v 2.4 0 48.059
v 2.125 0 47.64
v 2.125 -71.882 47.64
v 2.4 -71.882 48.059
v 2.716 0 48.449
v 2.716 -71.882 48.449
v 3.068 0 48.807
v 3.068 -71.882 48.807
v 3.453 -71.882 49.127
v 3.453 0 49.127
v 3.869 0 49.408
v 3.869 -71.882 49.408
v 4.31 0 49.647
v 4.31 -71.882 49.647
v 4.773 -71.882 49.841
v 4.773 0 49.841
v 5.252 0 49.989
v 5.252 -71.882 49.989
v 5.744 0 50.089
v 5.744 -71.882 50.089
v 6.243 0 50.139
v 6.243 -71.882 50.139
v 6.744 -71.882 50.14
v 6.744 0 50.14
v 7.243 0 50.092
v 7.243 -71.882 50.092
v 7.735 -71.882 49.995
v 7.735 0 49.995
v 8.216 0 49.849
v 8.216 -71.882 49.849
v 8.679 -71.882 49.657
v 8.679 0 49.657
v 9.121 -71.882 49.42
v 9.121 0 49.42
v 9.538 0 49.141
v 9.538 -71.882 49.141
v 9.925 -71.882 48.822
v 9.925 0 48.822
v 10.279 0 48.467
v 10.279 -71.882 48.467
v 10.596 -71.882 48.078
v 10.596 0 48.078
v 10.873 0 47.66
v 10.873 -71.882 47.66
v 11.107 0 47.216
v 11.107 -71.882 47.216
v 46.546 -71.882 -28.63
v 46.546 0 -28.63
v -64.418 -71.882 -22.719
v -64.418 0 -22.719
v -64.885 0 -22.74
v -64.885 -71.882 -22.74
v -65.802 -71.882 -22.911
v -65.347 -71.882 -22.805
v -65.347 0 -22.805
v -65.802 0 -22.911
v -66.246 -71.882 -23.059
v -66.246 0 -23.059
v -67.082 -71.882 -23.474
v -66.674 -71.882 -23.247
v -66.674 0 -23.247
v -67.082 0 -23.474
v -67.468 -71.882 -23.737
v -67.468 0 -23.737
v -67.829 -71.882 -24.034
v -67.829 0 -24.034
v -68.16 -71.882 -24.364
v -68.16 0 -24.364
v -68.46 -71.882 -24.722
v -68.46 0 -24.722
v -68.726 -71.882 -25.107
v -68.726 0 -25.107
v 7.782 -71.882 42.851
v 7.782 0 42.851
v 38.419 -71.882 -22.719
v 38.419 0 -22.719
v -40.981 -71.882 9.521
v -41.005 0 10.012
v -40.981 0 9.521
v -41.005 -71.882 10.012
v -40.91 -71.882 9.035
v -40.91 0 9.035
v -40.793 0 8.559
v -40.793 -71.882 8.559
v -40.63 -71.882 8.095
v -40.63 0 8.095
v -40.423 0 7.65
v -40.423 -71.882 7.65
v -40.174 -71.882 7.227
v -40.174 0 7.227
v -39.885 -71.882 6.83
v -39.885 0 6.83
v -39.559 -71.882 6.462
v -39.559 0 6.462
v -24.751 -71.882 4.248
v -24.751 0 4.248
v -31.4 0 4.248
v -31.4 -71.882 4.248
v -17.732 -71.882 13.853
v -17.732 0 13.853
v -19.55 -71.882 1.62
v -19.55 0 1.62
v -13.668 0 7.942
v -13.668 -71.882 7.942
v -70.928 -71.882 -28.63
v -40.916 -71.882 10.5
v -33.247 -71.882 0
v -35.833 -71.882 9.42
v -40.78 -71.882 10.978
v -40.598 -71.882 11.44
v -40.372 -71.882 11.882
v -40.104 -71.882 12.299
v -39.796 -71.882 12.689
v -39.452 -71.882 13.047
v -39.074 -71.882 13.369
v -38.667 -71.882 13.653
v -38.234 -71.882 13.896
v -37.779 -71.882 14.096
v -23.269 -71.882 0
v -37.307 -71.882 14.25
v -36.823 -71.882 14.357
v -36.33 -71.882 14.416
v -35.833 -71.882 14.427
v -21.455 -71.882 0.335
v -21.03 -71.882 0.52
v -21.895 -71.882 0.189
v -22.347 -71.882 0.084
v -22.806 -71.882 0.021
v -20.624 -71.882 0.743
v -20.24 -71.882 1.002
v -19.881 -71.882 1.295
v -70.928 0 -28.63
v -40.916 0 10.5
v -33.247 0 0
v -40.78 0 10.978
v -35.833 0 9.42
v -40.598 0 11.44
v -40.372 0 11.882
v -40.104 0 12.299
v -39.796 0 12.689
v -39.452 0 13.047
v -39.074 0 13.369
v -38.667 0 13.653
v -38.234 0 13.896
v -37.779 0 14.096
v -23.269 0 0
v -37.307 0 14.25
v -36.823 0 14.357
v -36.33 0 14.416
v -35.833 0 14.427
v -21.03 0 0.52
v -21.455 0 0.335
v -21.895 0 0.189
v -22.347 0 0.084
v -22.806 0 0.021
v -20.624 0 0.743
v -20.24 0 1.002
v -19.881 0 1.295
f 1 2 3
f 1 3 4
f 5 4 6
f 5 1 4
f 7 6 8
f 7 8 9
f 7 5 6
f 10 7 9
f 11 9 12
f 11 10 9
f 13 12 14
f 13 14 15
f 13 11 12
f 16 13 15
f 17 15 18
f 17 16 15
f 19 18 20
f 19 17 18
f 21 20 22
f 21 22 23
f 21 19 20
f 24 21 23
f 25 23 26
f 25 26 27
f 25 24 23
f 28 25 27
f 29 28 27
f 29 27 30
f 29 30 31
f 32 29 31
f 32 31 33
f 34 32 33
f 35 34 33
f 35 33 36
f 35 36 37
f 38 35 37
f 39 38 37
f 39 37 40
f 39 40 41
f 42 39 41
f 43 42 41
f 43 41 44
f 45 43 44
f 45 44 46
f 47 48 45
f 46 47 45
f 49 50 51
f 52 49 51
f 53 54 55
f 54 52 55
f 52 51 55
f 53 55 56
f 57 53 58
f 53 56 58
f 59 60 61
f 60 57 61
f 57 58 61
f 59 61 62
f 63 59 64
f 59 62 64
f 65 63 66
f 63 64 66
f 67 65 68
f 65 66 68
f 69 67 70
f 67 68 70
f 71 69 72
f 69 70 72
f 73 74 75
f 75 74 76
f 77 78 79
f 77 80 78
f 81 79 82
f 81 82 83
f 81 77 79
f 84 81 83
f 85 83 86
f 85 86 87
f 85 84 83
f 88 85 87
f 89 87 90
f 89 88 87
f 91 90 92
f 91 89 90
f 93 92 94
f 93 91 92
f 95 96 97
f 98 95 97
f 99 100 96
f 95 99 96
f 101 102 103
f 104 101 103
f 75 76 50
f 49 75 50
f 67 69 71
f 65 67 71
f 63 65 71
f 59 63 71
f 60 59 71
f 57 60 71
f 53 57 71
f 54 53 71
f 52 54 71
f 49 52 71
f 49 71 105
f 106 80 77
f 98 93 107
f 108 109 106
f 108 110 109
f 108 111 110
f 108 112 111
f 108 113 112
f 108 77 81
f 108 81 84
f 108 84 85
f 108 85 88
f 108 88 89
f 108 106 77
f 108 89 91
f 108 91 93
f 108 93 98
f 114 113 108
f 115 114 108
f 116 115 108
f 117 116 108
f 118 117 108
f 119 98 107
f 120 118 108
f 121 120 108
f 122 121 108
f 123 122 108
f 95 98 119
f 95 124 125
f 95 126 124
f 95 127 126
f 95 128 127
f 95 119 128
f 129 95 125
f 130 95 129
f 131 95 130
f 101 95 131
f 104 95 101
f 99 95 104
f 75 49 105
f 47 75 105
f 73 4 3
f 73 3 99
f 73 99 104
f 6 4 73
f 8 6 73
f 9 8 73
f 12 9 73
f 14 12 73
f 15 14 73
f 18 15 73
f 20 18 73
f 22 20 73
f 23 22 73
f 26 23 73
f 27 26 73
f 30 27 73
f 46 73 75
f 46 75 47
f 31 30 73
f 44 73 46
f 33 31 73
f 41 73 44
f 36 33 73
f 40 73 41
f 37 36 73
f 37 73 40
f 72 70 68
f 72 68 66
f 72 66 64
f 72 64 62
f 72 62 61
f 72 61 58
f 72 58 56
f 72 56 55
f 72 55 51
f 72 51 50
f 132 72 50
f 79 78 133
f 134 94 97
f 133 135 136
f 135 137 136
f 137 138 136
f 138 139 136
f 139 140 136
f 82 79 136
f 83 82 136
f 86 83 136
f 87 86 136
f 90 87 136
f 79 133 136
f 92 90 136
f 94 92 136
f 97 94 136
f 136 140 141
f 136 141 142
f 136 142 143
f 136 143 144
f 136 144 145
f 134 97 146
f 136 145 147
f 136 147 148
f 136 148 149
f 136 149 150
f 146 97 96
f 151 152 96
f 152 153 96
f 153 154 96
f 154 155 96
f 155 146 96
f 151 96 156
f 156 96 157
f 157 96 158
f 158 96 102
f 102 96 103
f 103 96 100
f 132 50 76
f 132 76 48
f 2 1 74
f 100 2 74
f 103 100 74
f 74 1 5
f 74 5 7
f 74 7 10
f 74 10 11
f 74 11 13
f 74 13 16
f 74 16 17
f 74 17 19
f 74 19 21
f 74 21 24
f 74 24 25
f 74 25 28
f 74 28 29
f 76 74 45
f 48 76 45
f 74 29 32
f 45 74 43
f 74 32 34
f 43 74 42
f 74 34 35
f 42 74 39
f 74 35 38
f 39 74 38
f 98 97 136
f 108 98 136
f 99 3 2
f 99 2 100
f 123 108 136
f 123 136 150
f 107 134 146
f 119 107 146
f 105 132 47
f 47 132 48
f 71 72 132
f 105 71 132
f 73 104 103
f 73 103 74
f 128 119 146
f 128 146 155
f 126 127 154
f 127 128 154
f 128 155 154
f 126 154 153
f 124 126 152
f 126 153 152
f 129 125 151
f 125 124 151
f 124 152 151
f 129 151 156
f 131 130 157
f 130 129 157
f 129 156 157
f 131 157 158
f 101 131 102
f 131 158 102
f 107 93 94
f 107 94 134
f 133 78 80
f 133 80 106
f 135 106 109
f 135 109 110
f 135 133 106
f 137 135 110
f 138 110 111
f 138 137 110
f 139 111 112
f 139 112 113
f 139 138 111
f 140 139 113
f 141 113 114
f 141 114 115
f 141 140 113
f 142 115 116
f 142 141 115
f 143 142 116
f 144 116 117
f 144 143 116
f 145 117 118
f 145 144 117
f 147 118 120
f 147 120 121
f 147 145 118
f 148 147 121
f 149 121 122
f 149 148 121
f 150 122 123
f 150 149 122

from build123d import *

# Parameters (mm, degrees)
F1_DEPTH    = 71.882
F2_R        = 5.08
F3_T1_DEPTH = 112.7375789557
F3_T3_DEPTH = 85.95990044
F3_T5_DEPTH = 120.1718750332
F3_T7_DEPTH = 82.9446926806


# Not quite as in the source:
# - a fillet or chamfer that OpenCascade refuses, or shapes differently, is made with other operations: its cross-section is extruded or revolved along the edge and cut away or added


with BuildPart() as f1:
    # F0 (on Front) → F1 (new body)
    with BuildSketch(Plane.XZ):
        Polygon((-35.8331985772, 9.4200642779), (-35.8331985772, 14.96128086), (-41.0050004721, 17.5471808761), (-41.0050004721, 7.9424064606), (-33.2472957671, 0), (-21.0566222668, 0), (-13.6683331802, 7.9424064606), (7.7815425405, 42.8511098702), (38.4191013873, -22.7189920843), (-67.233428359, -22.7189920843), (-70.92756778, -28.6296233535), (46.5462207794, -28.6296233535), (7.0188767277, 55.9662804008), (-17.7318900824, 13.8530377299), (-24.750765413, 4.2482619174), (-31.4002260566, 4.2482619174), align=None)
    extrude(amount=F1_DEPTH)

    # F2
    f2_edges = [f1.edges().sort_by_distance(p)[0] for p in [
        (-41.005, -35.941, 7.942406),
    ]]
    fillet(f2_edges, radius=F2_R)

    # F3: fillet of radius 5.08 on 4 edges, made by hand

    # F3_s2 → F3_t1 (cut)
    with BuildSketch(Plane.XZ.offset(-20.4277894779)):
        with BuildLine():
            ThreePointArc((-41.0050004721, 10.0116893284), (-38.3510310012, 13.8358325022), (-33.6965318012, 13.8929478568))
            Line((-33.6965318012, 13.8929478568), (-41.0050004721, 17.5471808761))
            Line((-41.0050004721, 17.5471808761), (-41.0050004721, 10.0116893284))
        make_face()
    extrude(amount=F3_T1_DEPTH, mode=Mode.SUBTRACT)

    # F3_s4 → F3_t3 (cut)
    with BuildSketch(Plane.XZ.offset(-7.03895022)):
        with BuildLine():
            ThreePointArc((-64.417848271, -22.7189920843), (-66.8804738001, -23.3558090469), (-68.7256813332, -25.1066001536))
            Line((-68.7256813332, -25.1066001536), (-67.233428359, -22.7189920843))
            Line((-67.233428359, -22.7189920843), (-64.417848271, -22.7189920843))
        make_face()
    extrude(amount=F3_T3_DEPTH, mode=Mode.SUBTRACT)

    # F3_s6 → F3_t5 (cut)
    with BuildSketch(Plane.XZ.offset(-24.1449375166)):
        with BuildLine():
            ThreePointArc((2.1252810988, 47.6398644221), (6.7441636939, 50.1402432188), (11.1072770532, 47.2163396005))
            Line((11.1072770532, 47.2163396005), (7.0188767277, 55.9662804008))
            Line((7.0188767277, 55.9662804008), (2.1252810988, 47.6398644221))
        make_face()
    extrude(amount=F3_T5_DEPTH, mode=Mode.SUBTRACT)

    # F3_s8 → F3_t7 (cut)
    with BuildSketch(Plane.XZ.offset(-5.5313463403)):
        with BuildLine():
            ThreePointArc((-23.2691608029, 0), (-21.2406694782, 0.4225733558), (-19.5496531088, 1.6199909663))
            Line((-19.5496531088, 1.6199909663), (-21.0566222668, 0))
            Line((-21.0566222668, 0), (-23.2691608029, 0))
        make_face()
    extrude(amount=F3_T7_DEPTH, mode=Mode.SUBTRACT)


solid = f1.part
